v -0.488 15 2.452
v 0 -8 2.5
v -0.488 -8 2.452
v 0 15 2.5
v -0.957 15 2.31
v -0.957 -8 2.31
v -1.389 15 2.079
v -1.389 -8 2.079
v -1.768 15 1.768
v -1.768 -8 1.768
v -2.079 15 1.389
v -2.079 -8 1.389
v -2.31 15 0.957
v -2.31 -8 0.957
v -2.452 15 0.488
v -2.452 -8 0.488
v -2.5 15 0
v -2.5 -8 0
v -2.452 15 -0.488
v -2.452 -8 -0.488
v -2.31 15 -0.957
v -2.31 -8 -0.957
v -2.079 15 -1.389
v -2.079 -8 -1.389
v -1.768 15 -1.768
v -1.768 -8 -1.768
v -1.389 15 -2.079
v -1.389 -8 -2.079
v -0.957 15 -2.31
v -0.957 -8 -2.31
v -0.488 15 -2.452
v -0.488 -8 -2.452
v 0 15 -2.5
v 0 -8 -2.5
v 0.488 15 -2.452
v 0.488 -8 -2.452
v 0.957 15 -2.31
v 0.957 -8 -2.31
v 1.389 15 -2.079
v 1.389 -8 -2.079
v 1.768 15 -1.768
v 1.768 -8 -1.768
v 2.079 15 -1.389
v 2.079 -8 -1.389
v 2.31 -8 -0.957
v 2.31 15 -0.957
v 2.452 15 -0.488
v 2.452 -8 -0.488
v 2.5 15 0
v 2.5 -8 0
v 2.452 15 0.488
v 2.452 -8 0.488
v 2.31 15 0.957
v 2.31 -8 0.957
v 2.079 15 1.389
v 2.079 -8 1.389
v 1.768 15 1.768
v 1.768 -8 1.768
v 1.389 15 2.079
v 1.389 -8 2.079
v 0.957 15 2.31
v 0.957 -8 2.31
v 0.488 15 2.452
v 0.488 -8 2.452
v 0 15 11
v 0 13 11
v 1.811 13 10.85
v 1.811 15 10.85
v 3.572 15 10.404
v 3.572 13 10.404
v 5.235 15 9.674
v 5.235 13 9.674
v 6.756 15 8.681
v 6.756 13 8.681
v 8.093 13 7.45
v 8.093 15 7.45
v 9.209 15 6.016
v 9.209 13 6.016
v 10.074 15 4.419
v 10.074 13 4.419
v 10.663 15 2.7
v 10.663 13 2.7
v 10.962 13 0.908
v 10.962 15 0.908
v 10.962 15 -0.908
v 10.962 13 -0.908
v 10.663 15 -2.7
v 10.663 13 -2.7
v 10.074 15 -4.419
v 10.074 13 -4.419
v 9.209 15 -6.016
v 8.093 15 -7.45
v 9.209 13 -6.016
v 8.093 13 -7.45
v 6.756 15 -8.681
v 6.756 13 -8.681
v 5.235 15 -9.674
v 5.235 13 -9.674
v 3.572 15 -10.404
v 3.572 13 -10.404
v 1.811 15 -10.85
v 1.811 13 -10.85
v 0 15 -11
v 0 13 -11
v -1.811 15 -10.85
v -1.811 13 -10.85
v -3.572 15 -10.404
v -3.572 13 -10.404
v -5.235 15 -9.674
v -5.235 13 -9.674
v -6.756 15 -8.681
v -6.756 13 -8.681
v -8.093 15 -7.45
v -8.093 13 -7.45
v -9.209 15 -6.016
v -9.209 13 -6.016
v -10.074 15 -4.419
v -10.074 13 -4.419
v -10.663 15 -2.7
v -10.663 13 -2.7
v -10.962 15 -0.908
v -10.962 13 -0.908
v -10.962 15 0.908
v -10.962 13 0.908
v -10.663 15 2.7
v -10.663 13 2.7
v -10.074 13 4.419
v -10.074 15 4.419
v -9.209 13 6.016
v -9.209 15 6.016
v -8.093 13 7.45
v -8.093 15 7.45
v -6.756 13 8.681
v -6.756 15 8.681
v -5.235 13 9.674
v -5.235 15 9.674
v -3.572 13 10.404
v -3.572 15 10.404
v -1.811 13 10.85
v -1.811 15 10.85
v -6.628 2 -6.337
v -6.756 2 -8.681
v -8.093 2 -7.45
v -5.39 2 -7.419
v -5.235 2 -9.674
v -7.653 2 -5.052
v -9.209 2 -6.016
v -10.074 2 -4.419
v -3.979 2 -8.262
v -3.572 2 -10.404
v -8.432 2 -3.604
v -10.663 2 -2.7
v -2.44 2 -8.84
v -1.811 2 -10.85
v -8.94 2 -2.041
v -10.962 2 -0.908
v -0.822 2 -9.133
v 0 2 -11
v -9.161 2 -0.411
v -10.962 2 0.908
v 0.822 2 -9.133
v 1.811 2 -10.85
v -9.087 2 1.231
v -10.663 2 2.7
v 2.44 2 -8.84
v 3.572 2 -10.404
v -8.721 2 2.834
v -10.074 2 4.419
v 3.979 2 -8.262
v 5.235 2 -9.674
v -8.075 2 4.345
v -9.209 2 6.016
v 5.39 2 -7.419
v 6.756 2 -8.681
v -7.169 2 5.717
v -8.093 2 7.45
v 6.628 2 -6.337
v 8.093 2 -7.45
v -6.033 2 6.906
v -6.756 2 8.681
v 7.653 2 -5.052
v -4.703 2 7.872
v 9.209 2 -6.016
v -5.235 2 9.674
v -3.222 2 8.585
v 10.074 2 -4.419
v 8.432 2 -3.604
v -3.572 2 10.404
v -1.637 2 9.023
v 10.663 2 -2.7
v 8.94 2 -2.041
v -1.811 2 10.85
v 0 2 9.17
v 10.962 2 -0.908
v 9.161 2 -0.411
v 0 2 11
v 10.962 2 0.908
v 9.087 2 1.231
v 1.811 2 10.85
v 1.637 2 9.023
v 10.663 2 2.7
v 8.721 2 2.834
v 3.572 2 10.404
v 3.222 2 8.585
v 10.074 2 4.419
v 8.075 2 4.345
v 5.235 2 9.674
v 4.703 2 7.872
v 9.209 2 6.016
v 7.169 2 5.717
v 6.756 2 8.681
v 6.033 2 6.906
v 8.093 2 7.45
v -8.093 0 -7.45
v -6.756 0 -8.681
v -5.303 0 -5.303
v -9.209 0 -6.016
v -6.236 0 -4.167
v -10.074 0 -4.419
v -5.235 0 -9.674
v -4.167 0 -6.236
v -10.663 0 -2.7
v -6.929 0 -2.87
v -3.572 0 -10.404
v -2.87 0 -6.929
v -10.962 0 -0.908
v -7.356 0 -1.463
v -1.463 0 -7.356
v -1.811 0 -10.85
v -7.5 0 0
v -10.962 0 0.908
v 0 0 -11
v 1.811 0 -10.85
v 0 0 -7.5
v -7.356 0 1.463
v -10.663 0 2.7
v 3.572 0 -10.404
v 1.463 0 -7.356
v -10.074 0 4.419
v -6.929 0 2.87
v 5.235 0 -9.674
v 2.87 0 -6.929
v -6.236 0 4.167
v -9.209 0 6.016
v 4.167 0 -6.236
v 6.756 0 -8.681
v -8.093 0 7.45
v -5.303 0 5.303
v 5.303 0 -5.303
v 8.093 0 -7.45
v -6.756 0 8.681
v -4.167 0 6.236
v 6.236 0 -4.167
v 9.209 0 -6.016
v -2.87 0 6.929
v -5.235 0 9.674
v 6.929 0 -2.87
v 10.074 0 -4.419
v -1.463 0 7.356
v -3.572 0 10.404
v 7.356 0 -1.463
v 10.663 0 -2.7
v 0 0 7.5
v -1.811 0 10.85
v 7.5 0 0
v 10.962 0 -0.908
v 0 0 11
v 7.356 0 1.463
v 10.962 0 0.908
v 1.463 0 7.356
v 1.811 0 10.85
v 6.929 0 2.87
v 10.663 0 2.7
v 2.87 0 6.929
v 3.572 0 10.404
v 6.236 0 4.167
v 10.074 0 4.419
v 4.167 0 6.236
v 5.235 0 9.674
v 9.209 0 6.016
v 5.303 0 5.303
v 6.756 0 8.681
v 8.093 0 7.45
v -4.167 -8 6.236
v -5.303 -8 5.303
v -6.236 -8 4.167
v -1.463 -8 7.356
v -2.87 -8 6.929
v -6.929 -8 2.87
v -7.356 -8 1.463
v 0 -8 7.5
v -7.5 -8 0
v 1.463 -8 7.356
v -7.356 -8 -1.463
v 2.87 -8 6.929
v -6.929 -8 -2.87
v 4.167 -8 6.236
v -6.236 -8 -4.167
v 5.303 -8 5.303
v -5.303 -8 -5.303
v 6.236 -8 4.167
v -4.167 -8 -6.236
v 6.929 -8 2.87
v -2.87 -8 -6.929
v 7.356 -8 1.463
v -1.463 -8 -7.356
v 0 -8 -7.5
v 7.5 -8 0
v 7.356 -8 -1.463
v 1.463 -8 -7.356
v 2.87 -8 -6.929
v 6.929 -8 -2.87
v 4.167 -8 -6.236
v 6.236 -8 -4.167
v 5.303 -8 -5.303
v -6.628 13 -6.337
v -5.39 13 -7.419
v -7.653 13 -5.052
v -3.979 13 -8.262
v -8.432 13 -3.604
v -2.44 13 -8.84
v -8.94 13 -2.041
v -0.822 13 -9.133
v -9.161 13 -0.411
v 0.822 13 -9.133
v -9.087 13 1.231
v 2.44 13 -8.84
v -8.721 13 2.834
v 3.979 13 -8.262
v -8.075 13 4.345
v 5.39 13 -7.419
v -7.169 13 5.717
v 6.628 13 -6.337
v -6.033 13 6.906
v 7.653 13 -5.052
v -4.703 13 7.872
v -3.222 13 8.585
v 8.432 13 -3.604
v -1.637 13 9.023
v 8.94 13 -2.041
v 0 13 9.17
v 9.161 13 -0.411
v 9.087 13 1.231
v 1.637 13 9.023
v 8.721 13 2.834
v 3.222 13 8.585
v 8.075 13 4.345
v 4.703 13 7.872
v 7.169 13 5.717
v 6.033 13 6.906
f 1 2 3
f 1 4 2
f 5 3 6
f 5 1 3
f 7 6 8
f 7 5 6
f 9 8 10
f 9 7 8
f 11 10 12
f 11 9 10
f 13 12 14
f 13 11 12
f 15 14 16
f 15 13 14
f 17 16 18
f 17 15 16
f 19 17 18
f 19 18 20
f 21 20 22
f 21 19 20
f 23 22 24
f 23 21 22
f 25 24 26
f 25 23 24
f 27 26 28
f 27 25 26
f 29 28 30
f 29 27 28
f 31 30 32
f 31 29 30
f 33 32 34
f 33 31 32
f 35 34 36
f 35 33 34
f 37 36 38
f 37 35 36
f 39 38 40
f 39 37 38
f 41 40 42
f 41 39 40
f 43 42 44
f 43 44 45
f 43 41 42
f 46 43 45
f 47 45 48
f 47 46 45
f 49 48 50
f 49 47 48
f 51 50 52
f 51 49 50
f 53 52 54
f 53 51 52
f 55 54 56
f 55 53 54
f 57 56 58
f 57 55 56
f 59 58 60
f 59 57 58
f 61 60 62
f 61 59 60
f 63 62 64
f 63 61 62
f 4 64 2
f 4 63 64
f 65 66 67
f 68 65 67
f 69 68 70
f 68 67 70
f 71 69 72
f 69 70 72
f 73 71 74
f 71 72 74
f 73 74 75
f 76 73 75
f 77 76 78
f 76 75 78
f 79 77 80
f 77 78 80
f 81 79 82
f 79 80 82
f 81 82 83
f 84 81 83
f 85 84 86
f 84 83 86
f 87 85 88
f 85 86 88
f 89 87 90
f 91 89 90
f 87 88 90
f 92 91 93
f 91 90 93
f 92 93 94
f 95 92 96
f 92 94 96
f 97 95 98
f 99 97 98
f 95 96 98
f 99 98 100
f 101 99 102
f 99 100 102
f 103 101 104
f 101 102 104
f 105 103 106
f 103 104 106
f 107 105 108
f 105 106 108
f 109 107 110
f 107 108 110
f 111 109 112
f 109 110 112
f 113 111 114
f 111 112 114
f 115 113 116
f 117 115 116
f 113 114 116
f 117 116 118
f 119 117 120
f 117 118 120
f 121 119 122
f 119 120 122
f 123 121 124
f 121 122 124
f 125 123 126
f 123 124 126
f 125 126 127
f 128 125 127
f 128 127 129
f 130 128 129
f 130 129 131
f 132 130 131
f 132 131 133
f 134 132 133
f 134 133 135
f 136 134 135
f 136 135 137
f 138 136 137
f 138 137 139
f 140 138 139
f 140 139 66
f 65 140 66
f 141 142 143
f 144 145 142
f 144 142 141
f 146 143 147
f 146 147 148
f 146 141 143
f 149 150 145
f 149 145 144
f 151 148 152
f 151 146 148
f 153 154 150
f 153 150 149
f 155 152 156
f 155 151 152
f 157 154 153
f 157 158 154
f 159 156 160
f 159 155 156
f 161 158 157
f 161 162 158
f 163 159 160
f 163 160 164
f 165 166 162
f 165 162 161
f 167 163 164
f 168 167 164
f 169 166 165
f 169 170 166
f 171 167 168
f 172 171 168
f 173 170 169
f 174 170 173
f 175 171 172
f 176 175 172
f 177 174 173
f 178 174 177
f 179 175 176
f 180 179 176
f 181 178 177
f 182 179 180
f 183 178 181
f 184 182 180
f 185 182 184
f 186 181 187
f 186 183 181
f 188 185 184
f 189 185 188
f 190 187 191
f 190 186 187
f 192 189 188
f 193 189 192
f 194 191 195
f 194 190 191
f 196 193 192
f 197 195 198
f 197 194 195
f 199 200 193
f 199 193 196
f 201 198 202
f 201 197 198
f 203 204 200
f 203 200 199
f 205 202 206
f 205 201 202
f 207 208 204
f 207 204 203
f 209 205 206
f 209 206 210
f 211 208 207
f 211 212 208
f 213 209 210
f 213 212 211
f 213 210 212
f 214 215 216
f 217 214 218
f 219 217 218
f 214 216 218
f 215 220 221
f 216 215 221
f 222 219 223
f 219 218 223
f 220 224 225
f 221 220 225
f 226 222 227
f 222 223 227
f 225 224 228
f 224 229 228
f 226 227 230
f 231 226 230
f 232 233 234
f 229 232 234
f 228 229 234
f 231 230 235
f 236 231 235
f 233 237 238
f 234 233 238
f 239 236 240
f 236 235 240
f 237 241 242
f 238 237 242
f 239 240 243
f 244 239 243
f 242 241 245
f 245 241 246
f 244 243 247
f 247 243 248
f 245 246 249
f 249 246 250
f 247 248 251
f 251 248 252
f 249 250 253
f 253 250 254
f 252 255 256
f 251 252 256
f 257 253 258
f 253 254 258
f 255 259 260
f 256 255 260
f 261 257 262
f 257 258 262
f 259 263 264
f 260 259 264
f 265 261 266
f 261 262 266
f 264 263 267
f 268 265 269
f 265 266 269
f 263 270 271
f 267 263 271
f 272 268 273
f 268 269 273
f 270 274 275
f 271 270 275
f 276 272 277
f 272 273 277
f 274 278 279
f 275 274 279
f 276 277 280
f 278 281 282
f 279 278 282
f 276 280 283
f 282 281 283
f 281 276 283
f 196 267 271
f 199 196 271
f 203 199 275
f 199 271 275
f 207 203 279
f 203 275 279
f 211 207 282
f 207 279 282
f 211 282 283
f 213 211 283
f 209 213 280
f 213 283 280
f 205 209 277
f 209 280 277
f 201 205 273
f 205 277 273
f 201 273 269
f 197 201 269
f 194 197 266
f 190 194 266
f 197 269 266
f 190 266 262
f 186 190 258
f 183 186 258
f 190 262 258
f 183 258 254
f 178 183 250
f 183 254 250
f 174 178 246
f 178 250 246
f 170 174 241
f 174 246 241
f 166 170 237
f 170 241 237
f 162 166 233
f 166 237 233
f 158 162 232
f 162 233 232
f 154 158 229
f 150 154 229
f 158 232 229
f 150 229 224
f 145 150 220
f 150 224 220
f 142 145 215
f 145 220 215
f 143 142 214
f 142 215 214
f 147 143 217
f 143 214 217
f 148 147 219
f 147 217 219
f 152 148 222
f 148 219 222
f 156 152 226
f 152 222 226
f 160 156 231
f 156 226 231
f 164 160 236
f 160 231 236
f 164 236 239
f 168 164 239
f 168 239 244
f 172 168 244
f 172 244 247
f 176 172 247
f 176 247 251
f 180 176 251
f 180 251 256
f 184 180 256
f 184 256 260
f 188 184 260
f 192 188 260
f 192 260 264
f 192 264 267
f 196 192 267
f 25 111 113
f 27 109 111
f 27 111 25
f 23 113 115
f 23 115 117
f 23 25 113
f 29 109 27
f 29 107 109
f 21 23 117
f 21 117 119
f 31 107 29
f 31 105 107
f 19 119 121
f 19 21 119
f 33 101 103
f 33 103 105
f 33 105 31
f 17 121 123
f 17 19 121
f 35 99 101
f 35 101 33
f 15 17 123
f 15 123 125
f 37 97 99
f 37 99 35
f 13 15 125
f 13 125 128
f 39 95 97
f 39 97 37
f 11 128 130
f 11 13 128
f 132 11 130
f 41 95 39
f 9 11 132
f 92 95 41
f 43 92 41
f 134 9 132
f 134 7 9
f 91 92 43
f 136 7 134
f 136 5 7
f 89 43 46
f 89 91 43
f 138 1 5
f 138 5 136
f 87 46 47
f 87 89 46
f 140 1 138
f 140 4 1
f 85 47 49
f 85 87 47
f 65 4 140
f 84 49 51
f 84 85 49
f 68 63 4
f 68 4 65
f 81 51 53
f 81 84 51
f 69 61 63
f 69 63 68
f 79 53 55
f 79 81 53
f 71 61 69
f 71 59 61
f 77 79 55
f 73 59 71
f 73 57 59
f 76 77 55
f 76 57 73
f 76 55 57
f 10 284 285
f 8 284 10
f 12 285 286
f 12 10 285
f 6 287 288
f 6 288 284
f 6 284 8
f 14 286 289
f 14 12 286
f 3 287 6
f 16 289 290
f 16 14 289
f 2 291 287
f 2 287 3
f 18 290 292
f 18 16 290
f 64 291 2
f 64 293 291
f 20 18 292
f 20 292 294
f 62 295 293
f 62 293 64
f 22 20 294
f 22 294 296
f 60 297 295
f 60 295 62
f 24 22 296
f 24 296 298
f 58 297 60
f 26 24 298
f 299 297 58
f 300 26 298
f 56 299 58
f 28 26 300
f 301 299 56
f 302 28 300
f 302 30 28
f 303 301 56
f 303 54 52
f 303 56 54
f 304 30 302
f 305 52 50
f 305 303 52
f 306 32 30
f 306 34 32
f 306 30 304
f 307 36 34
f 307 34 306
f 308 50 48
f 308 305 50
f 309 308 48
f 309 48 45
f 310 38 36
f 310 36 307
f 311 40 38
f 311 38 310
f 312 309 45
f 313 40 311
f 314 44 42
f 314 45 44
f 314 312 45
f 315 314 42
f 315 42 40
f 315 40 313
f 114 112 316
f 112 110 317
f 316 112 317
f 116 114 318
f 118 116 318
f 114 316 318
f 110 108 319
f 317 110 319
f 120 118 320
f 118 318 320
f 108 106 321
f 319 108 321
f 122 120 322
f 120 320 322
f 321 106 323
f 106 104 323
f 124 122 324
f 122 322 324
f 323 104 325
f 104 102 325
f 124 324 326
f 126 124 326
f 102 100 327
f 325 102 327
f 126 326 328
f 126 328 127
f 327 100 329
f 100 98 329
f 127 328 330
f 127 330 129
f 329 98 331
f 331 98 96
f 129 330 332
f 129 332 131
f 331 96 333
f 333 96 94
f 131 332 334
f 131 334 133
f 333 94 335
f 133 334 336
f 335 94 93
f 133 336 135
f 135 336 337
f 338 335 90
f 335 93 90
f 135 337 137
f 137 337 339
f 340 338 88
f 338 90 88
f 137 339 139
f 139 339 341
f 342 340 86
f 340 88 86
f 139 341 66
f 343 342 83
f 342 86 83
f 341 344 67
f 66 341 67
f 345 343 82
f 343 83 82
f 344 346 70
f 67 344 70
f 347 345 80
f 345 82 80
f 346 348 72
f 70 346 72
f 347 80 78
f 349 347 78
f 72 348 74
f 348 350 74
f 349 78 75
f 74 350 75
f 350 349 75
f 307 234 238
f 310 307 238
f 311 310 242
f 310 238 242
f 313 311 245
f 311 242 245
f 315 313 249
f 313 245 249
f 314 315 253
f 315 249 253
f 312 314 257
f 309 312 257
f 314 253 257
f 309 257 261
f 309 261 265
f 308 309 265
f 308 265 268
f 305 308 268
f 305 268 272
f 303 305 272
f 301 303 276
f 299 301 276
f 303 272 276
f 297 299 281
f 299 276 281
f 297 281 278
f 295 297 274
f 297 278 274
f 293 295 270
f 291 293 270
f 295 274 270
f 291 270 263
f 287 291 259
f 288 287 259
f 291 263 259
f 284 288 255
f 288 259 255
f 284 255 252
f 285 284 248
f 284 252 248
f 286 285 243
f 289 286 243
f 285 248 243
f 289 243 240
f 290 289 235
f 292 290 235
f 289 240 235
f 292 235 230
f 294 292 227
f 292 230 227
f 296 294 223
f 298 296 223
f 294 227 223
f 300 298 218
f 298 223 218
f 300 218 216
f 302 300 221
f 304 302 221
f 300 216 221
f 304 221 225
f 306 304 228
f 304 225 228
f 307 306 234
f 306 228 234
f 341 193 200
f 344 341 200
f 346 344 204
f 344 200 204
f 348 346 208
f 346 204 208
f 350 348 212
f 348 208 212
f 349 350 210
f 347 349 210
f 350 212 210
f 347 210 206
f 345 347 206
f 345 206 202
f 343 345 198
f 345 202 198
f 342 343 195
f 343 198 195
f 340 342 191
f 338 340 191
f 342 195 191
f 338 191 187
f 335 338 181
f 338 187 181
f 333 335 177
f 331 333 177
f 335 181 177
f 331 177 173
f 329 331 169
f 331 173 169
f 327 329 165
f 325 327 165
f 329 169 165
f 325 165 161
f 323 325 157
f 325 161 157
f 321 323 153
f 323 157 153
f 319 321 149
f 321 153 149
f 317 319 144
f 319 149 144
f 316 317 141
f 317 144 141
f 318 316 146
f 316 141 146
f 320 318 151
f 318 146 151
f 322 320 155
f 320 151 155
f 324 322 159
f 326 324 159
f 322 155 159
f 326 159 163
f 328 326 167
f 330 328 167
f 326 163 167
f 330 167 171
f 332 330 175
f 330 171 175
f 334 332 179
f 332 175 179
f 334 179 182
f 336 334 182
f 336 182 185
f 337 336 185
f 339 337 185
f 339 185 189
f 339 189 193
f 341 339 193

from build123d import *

# Parameters (mm, degrees)
SKETCH_1_R          = 11
EXTRUDE_1_DEPTH     = 2
SKETCH_2_R          = 9.17
EXTRUDE_2_DEPTH     = 11
SKETCH_3_R          = 11
EXTRUDE_3_DEPTH     = 2
SKETCH_4_R          = 2.5
CUT_EXTRUDE_1_DEPTH = 26
SKETCH_5_R          = 7.5
SKETCH_5_R_2        = 2.5
EXTRUDE_4_DEPTH     = 8


with BuildPart() as part:
    # 草图1 → 凸台-拉伸1 (new body)
    with BuildSketch(Plane(origin=(0, 0, 0), x_dir=(1, 0, 0), z_dir=(0, 1, 0))):
        with Locations(Location((0, 0, 0), (0, 0, 270))):
            Circle(SKETCH_1_R)
    extrude(amount=EXTRUDE_1_DEPTH)

    # 草图2 → 凸台-拉伸2 (add)
    with BuildSketch(Plane(origin=(0, 2, 0), x_dir=(1, 0, 0), z_dir=(0, 1, 0))):
        with Locations(Location((0, 0, 0), (0, 0, 270))):
            Circle(SKETCH_2_R)
    extrude(amount=EXTRUDE_2_DEPTH)

    # 草图3 → 凸台-拉伸3 (add)
    with BuildSketch(Plane(origin=(0, 13, 0), x_dir=(1, 0, 0), z_dir=(0, 1, 0))):
        with Locations(Location((0, 0, 0), (0, 0, 270))):
            Circle(SKETCH_3_R)
    extrude(amount=EXTRUDE_3_DEPTH)

    # 草图4 → 切除-拉伸1 (cut)
    with BuildSketch(Plane(origin=(0, 15, 0), x_dir=(1, 0, 0), z_dir=(0, 1, 0))):
        with Locations(Location((0, 0, 0), (0, 0, 270))):
            Circle(SKETCH_4_R)
    extrude(amount=-CUT_EXTRUDE_1_DEPTH, mode=Mode.SUBTRACT)

    # 草图5 → 凸台-拉伸4 (add)
    with BuildSketch(Plane.XZ):
        with Locations(Location((0, 0, 0), (0, 0, 270))):
            Circle(SKETCH_5_R)
        with Locations(Location((0, 0, 0), (0, 0, 90))):
            Circle(SKETCH_5_R_2, mode=Mode.SUBTRACT)
    extrude(amount=EXTRUDE_4_DEPTH)


solid = part.part
